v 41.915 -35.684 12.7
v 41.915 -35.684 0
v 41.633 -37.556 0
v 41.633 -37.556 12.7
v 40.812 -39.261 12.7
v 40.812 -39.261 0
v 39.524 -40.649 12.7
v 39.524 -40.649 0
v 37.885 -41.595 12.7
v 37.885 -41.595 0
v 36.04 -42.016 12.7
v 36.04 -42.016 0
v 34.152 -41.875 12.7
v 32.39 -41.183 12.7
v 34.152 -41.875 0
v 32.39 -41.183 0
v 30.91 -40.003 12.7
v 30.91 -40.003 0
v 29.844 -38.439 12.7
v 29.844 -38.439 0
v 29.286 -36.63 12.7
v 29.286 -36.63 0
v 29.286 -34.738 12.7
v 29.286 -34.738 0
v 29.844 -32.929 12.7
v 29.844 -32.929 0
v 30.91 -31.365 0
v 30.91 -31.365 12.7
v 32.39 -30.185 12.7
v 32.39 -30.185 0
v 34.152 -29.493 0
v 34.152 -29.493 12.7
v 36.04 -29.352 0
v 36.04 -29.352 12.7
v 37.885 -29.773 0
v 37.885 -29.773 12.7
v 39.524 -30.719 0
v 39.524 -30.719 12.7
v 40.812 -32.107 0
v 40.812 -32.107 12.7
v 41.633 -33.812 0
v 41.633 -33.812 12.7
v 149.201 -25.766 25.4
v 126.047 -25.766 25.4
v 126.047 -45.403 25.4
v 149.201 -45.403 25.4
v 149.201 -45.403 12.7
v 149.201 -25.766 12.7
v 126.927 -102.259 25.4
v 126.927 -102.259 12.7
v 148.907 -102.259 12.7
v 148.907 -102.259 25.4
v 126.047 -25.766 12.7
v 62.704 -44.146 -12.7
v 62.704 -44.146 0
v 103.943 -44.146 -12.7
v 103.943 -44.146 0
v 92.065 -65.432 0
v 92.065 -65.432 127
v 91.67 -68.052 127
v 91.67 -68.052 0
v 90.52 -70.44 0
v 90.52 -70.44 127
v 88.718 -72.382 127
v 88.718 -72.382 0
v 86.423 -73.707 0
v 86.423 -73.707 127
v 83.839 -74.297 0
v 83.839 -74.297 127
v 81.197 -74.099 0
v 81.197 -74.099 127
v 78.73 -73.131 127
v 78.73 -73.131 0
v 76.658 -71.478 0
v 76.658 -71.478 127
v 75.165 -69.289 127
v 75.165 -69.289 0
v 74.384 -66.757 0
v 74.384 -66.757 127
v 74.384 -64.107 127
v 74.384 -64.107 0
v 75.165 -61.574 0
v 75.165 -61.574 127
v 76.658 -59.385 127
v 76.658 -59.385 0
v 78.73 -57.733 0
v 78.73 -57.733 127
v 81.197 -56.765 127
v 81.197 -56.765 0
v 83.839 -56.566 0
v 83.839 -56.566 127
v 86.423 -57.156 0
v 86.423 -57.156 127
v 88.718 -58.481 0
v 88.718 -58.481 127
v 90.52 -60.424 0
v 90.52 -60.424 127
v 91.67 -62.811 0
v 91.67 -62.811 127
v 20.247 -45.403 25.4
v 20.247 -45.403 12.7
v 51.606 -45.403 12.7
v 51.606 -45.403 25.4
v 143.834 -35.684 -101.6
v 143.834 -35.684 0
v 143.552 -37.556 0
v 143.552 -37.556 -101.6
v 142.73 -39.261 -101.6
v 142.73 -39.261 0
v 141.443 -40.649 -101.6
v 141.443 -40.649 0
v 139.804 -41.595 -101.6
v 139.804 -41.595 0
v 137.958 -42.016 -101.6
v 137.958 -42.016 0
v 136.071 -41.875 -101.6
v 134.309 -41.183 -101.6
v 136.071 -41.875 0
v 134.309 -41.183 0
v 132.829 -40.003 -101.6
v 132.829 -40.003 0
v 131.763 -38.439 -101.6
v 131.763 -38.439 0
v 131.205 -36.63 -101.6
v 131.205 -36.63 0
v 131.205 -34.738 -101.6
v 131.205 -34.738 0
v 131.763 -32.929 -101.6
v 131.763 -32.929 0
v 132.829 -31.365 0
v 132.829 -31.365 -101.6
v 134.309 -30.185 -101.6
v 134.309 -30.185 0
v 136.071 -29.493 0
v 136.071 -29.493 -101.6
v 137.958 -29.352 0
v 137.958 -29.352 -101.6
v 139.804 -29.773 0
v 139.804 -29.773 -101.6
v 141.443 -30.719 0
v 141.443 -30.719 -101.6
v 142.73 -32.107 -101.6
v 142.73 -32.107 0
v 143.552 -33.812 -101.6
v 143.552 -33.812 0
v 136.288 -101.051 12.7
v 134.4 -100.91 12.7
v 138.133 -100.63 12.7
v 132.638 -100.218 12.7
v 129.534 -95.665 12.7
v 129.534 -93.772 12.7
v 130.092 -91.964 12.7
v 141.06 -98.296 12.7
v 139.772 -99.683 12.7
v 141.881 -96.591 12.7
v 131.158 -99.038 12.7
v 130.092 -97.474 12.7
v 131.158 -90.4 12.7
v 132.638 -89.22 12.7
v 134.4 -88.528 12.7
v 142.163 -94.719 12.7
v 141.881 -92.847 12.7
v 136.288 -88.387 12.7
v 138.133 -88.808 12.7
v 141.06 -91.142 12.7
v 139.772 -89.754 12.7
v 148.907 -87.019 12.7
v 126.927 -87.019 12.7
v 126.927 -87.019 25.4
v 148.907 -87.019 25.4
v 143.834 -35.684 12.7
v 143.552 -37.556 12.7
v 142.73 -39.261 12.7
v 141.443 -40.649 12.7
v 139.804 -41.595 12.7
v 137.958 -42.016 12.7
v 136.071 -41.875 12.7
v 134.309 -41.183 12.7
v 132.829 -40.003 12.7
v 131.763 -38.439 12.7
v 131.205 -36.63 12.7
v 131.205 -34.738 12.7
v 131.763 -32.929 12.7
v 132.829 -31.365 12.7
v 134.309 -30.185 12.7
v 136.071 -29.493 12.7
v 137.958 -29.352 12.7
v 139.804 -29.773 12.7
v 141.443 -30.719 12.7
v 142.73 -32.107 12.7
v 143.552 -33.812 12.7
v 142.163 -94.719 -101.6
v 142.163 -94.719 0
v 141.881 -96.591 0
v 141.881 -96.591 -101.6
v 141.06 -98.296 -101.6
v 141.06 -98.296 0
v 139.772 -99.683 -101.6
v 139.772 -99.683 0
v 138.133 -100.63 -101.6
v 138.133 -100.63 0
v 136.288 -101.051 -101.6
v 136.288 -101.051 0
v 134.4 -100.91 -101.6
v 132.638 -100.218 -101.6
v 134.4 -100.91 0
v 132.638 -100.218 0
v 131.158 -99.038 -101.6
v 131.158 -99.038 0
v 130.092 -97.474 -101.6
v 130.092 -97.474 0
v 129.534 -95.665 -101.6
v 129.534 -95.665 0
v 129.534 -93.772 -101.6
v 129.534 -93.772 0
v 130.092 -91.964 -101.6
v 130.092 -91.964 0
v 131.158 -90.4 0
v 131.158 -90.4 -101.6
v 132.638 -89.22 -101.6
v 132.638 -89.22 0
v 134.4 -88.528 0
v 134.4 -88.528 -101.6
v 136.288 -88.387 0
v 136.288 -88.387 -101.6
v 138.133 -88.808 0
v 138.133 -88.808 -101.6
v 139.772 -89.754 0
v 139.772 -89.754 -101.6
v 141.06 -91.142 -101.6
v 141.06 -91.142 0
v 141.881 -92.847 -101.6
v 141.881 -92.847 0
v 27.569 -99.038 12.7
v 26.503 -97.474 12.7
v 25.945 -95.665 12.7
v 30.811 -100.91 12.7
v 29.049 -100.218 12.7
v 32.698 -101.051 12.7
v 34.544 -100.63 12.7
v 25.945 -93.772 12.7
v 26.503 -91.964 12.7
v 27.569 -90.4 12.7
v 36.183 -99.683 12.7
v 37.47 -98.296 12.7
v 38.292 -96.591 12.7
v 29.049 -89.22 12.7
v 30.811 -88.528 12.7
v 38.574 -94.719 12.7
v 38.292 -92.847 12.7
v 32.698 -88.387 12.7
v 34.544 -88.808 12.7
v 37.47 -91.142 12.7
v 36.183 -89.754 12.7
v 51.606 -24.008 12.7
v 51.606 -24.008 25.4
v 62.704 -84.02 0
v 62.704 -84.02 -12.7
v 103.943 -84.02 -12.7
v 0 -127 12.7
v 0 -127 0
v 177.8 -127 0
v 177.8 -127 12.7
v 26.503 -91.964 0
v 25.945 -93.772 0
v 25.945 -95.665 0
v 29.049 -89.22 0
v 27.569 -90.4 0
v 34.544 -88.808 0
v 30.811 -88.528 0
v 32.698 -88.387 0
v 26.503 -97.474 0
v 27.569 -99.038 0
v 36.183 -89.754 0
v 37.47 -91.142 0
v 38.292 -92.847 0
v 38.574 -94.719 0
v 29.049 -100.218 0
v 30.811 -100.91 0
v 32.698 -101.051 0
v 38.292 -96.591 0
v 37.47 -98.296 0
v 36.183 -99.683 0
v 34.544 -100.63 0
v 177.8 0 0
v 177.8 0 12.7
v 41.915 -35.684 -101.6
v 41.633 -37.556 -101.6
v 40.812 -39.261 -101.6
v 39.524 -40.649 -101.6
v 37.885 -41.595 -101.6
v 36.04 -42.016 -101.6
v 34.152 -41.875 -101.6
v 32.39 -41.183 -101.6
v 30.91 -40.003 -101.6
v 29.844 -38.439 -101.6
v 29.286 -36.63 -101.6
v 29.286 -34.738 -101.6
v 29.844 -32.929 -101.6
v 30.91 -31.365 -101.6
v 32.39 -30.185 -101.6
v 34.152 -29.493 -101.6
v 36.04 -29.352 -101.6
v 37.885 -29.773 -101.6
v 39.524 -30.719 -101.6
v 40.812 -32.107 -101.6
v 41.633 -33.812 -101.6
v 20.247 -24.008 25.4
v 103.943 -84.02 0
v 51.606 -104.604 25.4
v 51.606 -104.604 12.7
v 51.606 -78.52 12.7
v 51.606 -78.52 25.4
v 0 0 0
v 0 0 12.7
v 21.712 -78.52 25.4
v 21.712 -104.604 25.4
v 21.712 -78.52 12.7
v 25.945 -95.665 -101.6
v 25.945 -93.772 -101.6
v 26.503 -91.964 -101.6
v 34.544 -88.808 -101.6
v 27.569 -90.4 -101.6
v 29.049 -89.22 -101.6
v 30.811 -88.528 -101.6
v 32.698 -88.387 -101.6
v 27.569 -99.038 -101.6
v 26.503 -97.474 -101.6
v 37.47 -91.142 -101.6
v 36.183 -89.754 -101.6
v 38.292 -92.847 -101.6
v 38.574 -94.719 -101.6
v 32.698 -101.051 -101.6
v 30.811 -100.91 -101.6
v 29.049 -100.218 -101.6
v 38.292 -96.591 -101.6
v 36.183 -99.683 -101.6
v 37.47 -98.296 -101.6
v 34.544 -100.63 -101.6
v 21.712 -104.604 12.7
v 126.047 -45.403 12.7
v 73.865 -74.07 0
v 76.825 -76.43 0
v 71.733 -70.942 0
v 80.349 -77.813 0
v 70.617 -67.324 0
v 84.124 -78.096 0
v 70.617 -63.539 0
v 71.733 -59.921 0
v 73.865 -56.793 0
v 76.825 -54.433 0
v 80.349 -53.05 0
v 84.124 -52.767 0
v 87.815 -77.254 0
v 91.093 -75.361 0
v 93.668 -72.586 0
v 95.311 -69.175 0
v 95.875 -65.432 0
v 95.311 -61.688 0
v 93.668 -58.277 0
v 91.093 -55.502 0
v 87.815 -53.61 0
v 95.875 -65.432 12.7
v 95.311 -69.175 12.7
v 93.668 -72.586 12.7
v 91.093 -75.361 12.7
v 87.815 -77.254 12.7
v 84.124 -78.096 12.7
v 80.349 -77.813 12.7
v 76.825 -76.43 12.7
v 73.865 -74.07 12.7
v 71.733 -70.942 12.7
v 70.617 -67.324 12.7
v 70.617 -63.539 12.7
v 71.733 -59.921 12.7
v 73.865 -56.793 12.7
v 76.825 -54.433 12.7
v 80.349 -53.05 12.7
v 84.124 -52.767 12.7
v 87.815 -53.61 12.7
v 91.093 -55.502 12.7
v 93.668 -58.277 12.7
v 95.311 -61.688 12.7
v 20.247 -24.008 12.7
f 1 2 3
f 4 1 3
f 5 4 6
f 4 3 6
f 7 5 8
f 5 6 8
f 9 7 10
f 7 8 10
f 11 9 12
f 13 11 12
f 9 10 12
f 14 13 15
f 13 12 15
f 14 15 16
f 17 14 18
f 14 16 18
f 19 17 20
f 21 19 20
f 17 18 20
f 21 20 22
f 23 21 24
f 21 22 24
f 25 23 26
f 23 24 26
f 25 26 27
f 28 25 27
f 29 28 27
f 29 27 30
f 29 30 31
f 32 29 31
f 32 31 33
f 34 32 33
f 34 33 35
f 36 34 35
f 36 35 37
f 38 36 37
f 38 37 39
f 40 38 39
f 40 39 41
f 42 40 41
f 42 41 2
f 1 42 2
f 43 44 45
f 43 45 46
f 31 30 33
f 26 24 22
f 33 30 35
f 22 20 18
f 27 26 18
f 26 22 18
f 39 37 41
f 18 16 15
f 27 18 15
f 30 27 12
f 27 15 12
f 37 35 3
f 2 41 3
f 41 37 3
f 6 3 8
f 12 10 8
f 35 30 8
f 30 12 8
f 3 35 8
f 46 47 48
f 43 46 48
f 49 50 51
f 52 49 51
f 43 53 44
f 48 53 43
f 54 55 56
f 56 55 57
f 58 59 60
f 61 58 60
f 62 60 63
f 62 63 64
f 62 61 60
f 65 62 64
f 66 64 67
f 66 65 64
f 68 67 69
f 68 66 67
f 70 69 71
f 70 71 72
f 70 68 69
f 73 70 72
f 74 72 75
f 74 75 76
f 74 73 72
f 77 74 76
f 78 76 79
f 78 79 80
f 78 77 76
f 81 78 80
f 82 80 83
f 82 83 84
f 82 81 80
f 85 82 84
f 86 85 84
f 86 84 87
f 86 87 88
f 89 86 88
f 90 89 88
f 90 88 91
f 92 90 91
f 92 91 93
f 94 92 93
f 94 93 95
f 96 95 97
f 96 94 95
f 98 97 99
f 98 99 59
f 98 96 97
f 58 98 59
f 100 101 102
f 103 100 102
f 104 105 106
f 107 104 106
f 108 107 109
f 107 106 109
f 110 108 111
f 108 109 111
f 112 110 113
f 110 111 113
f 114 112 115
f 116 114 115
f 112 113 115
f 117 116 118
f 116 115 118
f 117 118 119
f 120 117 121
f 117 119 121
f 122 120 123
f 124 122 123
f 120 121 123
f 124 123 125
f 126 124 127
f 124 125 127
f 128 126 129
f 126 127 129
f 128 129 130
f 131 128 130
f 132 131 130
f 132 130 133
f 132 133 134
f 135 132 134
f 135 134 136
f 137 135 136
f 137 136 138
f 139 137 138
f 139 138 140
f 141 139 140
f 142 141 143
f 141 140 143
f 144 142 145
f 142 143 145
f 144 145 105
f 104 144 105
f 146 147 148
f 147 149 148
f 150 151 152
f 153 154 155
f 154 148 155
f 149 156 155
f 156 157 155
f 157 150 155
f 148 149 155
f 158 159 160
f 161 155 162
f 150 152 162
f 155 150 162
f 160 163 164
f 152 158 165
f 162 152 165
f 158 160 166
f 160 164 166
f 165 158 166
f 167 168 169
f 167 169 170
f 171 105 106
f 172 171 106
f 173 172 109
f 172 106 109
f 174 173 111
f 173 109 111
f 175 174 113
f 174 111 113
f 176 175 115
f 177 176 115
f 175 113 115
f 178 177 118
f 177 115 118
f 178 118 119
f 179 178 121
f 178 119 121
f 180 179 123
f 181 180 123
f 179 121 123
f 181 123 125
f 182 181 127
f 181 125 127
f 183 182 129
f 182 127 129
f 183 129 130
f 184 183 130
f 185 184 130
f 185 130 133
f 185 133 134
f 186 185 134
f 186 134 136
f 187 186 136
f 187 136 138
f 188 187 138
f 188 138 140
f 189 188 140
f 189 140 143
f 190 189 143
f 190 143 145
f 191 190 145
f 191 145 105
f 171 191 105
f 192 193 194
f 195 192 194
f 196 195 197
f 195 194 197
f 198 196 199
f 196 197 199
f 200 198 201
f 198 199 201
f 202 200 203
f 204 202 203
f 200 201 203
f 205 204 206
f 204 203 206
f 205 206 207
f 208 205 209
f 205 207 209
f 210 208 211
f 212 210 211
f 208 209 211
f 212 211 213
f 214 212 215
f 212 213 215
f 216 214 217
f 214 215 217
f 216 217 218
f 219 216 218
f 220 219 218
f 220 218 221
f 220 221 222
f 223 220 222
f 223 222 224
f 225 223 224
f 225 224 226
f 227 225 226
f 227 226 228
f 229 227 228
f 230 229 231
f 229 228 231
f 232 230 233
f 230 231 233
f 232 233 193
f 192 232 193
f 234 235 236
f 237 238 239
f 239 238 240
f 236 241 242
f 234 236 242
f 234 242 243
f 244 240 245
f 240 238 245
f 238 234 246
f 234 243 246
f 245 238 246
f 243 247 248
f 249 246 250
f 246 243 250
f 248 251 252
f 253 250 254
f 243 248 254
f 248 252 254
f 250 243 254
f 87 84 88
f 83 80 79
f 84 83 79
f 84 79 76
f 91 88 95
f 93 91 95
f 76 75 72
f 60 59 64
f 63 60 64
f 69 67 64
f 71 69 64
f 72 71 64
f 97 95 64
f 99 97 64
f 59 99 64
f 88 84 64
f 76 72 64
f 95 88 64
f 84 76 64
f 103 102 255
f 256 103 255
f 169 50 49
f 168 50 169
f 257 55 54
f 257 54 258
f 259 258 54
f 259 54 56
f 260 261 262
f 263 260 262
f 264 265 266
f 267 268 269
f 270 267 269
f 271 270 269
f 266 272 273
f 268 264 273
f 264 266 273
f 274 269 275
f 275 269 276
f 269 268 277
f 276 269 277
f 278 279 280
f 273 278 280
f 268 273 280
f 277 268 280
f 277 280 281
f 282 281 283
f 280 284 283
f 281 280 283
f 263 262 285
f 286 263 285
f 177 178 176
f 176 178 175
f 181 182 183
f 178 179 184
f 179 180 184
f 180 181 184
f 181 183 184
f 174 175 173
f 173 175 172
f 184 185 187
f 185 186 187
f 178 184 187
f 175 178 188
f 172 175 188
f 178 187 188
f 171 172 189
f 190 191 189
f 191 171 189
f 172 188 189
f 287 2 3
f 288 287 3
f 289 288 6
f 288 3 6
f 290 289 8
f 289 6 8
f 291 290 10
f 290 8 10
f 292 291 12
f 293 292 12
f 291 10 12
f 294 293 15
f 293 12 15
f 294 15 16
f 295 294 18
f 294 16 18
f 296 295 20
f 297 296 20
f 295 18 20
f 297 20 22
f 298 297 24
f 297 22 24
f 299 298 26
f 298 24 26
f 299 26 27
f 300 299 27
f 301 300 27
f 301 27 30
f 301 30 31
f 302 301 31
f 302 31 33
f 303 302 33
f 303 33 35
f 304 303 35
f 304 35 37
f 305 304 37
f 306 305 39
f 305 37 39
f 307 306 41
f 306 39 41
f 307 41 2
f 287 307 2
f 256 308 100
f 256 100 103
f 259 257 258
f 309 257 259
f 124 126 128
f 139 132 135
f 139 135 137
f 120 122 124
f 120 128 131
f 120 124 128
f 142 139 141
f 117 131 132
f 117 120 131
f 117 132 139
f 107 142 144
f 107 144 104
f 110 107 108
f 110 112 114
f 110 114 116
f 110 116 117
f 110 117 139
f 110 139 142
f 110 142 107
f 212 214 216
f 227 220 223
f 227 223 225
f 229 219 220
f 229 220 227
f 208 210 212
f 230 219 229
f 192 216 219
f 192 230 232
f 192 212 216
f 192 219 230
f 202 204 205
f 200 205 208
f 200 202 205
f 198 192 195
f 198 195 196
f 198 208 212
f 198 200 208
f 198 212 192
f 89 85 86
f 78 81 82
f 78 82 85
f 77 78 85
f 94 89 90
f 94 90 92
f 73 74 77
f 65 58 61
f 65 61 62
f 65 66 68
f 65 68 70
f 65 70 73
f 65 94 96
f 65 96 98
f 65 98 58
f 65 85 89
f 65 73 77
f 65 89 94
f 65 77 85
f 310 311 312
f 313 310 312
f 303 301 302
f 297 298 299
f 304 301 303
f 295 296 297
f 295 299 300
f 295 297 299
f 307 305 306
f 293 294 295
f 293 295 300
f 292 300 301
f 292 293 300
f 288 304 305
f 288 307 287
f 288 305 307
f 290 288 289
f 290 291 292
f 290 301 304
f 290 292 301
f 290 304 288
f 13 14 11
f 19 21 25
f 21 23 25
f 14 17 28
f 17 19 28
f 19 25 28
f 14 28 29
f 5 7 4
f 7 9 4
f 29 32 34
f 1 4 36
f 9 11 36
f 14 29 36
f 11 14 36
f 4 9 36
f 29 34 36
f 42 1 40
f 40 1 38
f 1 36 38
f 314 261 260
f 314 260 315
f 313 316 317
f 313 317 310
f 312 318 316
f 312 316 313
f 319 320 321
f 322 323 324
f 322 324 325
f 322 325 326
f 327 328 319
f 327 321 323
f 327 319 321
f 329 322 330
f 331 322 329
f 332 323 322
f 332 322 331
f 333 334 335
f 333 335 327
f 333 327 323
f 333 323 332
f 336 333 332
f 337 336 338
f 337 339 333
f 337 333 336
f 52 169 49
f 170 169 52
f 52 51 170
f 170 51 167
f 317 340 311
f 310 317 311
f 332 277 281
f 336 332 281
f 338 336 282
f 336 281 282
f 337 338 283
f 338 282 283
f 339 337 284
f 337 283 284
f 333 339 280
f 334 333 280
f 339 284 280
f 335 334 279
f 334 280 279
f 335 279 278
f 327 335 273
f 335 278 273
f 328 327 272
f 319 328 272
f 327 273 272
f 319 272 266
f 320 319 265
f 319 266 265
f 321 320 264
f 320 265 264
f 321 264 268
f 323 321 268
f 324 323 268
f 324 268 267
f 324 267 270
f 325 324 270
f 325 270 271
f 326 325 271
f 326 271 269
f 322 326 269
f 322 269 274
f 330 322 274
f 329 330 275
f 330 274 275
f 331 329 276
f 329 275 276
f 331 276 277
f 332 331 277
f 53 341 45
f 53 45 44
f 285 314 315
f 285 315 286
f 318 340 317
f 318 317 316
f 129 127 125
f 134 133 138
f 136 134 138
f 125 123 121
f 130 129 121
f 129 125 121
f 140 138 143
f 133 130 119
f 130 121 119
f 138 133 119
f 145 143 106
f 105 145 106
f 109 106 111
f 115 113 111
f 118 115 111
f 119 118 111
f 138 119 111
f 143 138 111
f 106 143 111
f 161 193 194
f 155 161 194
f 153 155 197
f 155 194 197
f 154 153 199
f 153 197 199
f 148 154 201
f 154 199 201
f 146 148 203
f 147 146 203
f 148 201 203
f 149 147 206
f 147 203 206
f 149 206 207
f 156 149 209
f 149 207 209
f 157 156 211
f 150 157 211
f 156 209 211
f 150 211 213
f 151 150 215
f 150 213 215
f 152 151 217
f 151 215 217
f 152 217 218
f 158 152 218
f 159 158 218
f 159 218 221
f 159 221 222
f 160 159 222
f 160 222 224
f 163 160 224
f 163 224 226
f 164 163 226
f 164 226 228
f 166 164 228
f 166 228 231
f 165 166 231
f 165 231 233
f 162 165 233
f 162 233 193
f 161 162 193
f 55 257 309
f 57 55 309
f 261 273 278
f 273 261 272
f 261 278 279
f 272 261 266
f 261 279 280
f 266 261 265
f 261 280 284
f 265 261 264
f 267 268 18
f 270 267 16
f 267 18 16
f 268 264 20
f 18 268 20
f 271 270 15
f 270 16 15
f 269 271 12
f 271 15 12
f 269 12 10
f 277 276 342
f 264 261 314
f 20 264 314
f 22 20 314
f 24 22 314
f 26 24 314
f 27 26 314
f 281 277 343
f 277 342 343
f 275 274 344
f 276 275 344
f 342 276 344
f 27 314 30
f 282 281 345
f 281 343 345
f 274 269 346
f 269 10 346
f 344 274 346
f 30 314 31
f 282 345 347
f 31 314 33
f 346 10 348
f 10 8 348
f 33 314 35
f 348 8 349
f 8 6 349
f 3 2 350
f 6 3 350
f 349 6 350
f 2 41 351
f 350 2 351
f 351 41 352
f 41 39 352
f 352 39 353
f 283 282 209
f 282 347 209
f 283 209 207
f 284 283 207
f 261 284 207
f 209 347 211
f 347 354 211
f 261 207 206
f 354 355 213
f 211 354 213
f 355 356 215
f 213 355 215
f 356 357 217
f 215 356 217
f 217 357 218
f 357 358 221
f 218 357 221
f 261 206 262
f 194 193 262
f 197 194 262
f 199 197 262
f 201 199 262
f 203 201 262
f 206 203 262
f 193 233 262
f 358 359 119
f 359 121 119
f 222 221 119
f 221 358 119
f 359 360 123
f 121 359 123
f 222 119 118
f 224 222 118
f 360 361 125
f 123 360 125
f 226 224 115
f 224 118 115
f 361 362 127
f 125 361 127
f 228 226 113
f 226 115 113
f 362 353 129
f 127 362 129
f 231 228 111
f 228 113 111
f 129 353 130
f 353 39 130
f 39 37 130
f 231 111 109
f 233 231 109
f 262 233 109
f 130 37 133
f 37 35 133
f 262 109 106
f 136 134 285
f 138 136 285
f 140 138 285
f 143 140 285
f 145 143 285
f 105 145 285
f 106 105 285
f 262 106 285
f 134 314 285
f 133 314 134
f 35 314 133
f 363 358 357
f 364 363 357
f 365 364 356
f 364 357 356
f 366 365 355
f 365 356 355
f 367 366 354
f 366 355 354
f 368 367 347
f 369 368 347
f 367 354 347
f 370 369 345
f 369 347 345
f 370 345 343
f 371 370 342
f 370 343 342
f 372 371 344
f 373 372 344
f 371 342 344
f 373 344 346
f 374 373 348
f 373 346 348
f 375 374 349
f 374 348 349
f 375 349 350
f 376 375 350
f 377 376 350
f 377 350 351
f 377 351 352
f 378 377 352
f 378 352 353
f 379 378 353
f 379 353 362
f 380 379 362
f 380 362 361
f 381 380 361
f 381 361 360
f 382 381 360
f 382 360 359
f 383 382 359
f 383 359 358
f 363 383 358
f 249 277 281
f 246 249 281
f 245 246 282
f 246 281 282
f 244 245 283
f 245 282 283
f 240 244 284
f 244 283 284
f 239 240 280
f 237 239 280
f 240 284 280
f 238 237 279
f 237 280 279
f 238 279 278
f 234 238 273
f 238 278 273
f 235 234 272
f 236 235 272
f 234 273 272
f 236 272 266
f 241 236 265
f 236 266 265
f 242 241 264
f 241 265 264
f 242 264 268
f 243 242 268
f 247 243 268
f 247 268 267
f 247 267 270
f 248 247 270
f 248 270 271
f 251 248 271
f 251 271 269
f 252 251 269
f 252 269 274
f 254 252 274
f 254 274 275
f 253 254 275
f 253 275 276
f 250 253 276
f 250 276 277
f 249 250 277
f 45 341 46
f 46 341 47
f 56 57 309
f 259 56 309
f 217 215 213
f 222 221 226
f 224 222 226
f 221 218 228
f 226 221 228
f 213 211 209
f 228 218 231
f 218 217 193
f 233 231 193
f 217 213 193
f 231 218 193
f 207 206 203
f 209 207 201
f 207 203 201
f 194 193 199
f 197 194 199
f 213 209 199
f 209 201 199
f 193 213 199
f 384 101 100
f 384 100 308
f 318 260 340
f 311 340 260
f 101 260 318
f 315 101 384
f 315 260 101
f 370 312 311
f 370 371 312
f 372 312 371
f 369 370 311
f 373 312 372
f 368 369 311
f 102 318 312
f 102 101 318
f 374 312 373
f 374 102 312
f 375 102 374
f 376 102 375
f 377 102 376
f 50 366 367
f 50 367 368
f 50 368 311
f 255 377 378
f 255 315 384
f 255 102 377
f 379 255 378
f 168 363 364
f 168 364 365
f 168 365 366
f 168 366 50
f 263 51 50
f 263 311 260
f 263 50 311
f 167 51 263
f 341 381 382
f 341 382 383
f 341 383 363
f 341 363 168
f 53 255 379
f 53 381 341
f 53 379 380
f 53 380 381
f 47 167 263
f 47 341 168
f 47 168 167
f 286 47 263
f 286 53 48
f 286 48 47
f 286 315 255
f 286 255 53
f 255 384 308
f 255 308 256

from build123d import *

# Parameters (mm, degrees)
F0_W      = 177.8
F0_H      = 127
F1_DEPTH  = 12.7
F2_R      = 12.7
F2_R_2    = 6.35
F3_DEPTH  = 25.4
F4_R      = 8.89
F5_DEPTH  = 127
F6_W      = 41.238896
F6_H      = 39.874394
F7_DEPTH  = 12.7
F9_R      = 6.35
F10_DEPTH = 101.6
F11_W     = 23.153082
F11_H     = 19.636153
F11_W_2   = 31.359231
F11_H_2   = 21.394614
F11_W_3   = 29.893847
F11_H_3   = 26.083842
F11_W_4   = 21.980763
F11_H_4   = 15.239998
F12_DEPTH = 12.7


with BuildPart() as f1:
    # F0 (on Top) → F1 (new body)
    with BuildSketch(Plane.XY):
        with Locations((88.9, -63.5)):
            Rectangle(F0_W, F0_H)
    extrude(amount=F1_DEPTH)

    # F2 (on face) → F3 (cut)
    with BuildSketch(Plane(origin=(0, 0, 0), x_dir=(1, 0, 0), z_dir=(0, 0, -1))):
        with Locations((83.17496, 65.431617)):
            Circle(F2_R)
        with Locations((135.812969, 94.718838)):
            Circle(F2_R_2)
        with Locations((137.483782, 35.68408)):
            Circle(F2_R_2)
        with Locations((35.56527, 35.68408)):
            Circle(F2_R_2)
        with Locations((32.223678, 94.718838)):
            Circle(F2_R_2)
    extrude(amount=-F3_DEPTH, mode=Mode.SUBTRACT)

    # F11 (on face) → F12 (join)
    with BuildSketch(Plane.XY.offset(12.7)):
        with Locations((137.624033, -35.584424)):
            Rectangle(F11_W, F11_H)
        with Locations((35.926347, -34.705194)):
            Rectangle(F11_W_2, F11_H_2)
        with Locations((36.659039, -91.562115)):
            Rectangle(F11_W_3, F11_H_3)
        with Locations((137.917116, -94.639428)):
            Rectangle(F11_W_4, F11_H_4)
    extrude(amount=F12_DEPTH)


with BuildPart() as f5:
    # F4 (on face) → F5 (new body)
    with BuildSketch(Plane(origin=(0, 0, 0), x_dir=(1, 0, 0), z_dir=(0, 0, -1))):
        with Locations((83.17496, 65.431617)):
            Circle(F4_R)
    extrude(amount=-F5_DEPTH)


with BuildPart() as f7:
    # F6 (on face) → F7 (new body)
    with BuildSketch(Plane(origin=(0, 0, 0), x_dir=(1, 0, 0), z_dir=(0, 0, -1))):
        with Locations((83.323773, 64.083038)):
            Rectangle(F6_W, F6_H)
    extrude(amount=F7_DEPTH)


with BuildPart() as f10:
    # F9 (on face) → F10 (new body)
    with BuildSketch(Plane(origin=(0, 0, 0), x_dir=(1, 0, 0), z_dir=(0, 0, -1))):
        with Locations((32.223678, 94.718838)):
            Circle(F9_R)
        with Locations((135.812969, 94.718838)):
            Circle(F9_R)
        with Locations((137.483782, 35.68408)):
            Circle(F9_R)
        with Locations((35.56527, 35.68408)):
            Circle(F9_R)
    extrude(amount=F10_DEPTH)


solid = Compound([f1.part, f5.part, f7.part, f10.part])
